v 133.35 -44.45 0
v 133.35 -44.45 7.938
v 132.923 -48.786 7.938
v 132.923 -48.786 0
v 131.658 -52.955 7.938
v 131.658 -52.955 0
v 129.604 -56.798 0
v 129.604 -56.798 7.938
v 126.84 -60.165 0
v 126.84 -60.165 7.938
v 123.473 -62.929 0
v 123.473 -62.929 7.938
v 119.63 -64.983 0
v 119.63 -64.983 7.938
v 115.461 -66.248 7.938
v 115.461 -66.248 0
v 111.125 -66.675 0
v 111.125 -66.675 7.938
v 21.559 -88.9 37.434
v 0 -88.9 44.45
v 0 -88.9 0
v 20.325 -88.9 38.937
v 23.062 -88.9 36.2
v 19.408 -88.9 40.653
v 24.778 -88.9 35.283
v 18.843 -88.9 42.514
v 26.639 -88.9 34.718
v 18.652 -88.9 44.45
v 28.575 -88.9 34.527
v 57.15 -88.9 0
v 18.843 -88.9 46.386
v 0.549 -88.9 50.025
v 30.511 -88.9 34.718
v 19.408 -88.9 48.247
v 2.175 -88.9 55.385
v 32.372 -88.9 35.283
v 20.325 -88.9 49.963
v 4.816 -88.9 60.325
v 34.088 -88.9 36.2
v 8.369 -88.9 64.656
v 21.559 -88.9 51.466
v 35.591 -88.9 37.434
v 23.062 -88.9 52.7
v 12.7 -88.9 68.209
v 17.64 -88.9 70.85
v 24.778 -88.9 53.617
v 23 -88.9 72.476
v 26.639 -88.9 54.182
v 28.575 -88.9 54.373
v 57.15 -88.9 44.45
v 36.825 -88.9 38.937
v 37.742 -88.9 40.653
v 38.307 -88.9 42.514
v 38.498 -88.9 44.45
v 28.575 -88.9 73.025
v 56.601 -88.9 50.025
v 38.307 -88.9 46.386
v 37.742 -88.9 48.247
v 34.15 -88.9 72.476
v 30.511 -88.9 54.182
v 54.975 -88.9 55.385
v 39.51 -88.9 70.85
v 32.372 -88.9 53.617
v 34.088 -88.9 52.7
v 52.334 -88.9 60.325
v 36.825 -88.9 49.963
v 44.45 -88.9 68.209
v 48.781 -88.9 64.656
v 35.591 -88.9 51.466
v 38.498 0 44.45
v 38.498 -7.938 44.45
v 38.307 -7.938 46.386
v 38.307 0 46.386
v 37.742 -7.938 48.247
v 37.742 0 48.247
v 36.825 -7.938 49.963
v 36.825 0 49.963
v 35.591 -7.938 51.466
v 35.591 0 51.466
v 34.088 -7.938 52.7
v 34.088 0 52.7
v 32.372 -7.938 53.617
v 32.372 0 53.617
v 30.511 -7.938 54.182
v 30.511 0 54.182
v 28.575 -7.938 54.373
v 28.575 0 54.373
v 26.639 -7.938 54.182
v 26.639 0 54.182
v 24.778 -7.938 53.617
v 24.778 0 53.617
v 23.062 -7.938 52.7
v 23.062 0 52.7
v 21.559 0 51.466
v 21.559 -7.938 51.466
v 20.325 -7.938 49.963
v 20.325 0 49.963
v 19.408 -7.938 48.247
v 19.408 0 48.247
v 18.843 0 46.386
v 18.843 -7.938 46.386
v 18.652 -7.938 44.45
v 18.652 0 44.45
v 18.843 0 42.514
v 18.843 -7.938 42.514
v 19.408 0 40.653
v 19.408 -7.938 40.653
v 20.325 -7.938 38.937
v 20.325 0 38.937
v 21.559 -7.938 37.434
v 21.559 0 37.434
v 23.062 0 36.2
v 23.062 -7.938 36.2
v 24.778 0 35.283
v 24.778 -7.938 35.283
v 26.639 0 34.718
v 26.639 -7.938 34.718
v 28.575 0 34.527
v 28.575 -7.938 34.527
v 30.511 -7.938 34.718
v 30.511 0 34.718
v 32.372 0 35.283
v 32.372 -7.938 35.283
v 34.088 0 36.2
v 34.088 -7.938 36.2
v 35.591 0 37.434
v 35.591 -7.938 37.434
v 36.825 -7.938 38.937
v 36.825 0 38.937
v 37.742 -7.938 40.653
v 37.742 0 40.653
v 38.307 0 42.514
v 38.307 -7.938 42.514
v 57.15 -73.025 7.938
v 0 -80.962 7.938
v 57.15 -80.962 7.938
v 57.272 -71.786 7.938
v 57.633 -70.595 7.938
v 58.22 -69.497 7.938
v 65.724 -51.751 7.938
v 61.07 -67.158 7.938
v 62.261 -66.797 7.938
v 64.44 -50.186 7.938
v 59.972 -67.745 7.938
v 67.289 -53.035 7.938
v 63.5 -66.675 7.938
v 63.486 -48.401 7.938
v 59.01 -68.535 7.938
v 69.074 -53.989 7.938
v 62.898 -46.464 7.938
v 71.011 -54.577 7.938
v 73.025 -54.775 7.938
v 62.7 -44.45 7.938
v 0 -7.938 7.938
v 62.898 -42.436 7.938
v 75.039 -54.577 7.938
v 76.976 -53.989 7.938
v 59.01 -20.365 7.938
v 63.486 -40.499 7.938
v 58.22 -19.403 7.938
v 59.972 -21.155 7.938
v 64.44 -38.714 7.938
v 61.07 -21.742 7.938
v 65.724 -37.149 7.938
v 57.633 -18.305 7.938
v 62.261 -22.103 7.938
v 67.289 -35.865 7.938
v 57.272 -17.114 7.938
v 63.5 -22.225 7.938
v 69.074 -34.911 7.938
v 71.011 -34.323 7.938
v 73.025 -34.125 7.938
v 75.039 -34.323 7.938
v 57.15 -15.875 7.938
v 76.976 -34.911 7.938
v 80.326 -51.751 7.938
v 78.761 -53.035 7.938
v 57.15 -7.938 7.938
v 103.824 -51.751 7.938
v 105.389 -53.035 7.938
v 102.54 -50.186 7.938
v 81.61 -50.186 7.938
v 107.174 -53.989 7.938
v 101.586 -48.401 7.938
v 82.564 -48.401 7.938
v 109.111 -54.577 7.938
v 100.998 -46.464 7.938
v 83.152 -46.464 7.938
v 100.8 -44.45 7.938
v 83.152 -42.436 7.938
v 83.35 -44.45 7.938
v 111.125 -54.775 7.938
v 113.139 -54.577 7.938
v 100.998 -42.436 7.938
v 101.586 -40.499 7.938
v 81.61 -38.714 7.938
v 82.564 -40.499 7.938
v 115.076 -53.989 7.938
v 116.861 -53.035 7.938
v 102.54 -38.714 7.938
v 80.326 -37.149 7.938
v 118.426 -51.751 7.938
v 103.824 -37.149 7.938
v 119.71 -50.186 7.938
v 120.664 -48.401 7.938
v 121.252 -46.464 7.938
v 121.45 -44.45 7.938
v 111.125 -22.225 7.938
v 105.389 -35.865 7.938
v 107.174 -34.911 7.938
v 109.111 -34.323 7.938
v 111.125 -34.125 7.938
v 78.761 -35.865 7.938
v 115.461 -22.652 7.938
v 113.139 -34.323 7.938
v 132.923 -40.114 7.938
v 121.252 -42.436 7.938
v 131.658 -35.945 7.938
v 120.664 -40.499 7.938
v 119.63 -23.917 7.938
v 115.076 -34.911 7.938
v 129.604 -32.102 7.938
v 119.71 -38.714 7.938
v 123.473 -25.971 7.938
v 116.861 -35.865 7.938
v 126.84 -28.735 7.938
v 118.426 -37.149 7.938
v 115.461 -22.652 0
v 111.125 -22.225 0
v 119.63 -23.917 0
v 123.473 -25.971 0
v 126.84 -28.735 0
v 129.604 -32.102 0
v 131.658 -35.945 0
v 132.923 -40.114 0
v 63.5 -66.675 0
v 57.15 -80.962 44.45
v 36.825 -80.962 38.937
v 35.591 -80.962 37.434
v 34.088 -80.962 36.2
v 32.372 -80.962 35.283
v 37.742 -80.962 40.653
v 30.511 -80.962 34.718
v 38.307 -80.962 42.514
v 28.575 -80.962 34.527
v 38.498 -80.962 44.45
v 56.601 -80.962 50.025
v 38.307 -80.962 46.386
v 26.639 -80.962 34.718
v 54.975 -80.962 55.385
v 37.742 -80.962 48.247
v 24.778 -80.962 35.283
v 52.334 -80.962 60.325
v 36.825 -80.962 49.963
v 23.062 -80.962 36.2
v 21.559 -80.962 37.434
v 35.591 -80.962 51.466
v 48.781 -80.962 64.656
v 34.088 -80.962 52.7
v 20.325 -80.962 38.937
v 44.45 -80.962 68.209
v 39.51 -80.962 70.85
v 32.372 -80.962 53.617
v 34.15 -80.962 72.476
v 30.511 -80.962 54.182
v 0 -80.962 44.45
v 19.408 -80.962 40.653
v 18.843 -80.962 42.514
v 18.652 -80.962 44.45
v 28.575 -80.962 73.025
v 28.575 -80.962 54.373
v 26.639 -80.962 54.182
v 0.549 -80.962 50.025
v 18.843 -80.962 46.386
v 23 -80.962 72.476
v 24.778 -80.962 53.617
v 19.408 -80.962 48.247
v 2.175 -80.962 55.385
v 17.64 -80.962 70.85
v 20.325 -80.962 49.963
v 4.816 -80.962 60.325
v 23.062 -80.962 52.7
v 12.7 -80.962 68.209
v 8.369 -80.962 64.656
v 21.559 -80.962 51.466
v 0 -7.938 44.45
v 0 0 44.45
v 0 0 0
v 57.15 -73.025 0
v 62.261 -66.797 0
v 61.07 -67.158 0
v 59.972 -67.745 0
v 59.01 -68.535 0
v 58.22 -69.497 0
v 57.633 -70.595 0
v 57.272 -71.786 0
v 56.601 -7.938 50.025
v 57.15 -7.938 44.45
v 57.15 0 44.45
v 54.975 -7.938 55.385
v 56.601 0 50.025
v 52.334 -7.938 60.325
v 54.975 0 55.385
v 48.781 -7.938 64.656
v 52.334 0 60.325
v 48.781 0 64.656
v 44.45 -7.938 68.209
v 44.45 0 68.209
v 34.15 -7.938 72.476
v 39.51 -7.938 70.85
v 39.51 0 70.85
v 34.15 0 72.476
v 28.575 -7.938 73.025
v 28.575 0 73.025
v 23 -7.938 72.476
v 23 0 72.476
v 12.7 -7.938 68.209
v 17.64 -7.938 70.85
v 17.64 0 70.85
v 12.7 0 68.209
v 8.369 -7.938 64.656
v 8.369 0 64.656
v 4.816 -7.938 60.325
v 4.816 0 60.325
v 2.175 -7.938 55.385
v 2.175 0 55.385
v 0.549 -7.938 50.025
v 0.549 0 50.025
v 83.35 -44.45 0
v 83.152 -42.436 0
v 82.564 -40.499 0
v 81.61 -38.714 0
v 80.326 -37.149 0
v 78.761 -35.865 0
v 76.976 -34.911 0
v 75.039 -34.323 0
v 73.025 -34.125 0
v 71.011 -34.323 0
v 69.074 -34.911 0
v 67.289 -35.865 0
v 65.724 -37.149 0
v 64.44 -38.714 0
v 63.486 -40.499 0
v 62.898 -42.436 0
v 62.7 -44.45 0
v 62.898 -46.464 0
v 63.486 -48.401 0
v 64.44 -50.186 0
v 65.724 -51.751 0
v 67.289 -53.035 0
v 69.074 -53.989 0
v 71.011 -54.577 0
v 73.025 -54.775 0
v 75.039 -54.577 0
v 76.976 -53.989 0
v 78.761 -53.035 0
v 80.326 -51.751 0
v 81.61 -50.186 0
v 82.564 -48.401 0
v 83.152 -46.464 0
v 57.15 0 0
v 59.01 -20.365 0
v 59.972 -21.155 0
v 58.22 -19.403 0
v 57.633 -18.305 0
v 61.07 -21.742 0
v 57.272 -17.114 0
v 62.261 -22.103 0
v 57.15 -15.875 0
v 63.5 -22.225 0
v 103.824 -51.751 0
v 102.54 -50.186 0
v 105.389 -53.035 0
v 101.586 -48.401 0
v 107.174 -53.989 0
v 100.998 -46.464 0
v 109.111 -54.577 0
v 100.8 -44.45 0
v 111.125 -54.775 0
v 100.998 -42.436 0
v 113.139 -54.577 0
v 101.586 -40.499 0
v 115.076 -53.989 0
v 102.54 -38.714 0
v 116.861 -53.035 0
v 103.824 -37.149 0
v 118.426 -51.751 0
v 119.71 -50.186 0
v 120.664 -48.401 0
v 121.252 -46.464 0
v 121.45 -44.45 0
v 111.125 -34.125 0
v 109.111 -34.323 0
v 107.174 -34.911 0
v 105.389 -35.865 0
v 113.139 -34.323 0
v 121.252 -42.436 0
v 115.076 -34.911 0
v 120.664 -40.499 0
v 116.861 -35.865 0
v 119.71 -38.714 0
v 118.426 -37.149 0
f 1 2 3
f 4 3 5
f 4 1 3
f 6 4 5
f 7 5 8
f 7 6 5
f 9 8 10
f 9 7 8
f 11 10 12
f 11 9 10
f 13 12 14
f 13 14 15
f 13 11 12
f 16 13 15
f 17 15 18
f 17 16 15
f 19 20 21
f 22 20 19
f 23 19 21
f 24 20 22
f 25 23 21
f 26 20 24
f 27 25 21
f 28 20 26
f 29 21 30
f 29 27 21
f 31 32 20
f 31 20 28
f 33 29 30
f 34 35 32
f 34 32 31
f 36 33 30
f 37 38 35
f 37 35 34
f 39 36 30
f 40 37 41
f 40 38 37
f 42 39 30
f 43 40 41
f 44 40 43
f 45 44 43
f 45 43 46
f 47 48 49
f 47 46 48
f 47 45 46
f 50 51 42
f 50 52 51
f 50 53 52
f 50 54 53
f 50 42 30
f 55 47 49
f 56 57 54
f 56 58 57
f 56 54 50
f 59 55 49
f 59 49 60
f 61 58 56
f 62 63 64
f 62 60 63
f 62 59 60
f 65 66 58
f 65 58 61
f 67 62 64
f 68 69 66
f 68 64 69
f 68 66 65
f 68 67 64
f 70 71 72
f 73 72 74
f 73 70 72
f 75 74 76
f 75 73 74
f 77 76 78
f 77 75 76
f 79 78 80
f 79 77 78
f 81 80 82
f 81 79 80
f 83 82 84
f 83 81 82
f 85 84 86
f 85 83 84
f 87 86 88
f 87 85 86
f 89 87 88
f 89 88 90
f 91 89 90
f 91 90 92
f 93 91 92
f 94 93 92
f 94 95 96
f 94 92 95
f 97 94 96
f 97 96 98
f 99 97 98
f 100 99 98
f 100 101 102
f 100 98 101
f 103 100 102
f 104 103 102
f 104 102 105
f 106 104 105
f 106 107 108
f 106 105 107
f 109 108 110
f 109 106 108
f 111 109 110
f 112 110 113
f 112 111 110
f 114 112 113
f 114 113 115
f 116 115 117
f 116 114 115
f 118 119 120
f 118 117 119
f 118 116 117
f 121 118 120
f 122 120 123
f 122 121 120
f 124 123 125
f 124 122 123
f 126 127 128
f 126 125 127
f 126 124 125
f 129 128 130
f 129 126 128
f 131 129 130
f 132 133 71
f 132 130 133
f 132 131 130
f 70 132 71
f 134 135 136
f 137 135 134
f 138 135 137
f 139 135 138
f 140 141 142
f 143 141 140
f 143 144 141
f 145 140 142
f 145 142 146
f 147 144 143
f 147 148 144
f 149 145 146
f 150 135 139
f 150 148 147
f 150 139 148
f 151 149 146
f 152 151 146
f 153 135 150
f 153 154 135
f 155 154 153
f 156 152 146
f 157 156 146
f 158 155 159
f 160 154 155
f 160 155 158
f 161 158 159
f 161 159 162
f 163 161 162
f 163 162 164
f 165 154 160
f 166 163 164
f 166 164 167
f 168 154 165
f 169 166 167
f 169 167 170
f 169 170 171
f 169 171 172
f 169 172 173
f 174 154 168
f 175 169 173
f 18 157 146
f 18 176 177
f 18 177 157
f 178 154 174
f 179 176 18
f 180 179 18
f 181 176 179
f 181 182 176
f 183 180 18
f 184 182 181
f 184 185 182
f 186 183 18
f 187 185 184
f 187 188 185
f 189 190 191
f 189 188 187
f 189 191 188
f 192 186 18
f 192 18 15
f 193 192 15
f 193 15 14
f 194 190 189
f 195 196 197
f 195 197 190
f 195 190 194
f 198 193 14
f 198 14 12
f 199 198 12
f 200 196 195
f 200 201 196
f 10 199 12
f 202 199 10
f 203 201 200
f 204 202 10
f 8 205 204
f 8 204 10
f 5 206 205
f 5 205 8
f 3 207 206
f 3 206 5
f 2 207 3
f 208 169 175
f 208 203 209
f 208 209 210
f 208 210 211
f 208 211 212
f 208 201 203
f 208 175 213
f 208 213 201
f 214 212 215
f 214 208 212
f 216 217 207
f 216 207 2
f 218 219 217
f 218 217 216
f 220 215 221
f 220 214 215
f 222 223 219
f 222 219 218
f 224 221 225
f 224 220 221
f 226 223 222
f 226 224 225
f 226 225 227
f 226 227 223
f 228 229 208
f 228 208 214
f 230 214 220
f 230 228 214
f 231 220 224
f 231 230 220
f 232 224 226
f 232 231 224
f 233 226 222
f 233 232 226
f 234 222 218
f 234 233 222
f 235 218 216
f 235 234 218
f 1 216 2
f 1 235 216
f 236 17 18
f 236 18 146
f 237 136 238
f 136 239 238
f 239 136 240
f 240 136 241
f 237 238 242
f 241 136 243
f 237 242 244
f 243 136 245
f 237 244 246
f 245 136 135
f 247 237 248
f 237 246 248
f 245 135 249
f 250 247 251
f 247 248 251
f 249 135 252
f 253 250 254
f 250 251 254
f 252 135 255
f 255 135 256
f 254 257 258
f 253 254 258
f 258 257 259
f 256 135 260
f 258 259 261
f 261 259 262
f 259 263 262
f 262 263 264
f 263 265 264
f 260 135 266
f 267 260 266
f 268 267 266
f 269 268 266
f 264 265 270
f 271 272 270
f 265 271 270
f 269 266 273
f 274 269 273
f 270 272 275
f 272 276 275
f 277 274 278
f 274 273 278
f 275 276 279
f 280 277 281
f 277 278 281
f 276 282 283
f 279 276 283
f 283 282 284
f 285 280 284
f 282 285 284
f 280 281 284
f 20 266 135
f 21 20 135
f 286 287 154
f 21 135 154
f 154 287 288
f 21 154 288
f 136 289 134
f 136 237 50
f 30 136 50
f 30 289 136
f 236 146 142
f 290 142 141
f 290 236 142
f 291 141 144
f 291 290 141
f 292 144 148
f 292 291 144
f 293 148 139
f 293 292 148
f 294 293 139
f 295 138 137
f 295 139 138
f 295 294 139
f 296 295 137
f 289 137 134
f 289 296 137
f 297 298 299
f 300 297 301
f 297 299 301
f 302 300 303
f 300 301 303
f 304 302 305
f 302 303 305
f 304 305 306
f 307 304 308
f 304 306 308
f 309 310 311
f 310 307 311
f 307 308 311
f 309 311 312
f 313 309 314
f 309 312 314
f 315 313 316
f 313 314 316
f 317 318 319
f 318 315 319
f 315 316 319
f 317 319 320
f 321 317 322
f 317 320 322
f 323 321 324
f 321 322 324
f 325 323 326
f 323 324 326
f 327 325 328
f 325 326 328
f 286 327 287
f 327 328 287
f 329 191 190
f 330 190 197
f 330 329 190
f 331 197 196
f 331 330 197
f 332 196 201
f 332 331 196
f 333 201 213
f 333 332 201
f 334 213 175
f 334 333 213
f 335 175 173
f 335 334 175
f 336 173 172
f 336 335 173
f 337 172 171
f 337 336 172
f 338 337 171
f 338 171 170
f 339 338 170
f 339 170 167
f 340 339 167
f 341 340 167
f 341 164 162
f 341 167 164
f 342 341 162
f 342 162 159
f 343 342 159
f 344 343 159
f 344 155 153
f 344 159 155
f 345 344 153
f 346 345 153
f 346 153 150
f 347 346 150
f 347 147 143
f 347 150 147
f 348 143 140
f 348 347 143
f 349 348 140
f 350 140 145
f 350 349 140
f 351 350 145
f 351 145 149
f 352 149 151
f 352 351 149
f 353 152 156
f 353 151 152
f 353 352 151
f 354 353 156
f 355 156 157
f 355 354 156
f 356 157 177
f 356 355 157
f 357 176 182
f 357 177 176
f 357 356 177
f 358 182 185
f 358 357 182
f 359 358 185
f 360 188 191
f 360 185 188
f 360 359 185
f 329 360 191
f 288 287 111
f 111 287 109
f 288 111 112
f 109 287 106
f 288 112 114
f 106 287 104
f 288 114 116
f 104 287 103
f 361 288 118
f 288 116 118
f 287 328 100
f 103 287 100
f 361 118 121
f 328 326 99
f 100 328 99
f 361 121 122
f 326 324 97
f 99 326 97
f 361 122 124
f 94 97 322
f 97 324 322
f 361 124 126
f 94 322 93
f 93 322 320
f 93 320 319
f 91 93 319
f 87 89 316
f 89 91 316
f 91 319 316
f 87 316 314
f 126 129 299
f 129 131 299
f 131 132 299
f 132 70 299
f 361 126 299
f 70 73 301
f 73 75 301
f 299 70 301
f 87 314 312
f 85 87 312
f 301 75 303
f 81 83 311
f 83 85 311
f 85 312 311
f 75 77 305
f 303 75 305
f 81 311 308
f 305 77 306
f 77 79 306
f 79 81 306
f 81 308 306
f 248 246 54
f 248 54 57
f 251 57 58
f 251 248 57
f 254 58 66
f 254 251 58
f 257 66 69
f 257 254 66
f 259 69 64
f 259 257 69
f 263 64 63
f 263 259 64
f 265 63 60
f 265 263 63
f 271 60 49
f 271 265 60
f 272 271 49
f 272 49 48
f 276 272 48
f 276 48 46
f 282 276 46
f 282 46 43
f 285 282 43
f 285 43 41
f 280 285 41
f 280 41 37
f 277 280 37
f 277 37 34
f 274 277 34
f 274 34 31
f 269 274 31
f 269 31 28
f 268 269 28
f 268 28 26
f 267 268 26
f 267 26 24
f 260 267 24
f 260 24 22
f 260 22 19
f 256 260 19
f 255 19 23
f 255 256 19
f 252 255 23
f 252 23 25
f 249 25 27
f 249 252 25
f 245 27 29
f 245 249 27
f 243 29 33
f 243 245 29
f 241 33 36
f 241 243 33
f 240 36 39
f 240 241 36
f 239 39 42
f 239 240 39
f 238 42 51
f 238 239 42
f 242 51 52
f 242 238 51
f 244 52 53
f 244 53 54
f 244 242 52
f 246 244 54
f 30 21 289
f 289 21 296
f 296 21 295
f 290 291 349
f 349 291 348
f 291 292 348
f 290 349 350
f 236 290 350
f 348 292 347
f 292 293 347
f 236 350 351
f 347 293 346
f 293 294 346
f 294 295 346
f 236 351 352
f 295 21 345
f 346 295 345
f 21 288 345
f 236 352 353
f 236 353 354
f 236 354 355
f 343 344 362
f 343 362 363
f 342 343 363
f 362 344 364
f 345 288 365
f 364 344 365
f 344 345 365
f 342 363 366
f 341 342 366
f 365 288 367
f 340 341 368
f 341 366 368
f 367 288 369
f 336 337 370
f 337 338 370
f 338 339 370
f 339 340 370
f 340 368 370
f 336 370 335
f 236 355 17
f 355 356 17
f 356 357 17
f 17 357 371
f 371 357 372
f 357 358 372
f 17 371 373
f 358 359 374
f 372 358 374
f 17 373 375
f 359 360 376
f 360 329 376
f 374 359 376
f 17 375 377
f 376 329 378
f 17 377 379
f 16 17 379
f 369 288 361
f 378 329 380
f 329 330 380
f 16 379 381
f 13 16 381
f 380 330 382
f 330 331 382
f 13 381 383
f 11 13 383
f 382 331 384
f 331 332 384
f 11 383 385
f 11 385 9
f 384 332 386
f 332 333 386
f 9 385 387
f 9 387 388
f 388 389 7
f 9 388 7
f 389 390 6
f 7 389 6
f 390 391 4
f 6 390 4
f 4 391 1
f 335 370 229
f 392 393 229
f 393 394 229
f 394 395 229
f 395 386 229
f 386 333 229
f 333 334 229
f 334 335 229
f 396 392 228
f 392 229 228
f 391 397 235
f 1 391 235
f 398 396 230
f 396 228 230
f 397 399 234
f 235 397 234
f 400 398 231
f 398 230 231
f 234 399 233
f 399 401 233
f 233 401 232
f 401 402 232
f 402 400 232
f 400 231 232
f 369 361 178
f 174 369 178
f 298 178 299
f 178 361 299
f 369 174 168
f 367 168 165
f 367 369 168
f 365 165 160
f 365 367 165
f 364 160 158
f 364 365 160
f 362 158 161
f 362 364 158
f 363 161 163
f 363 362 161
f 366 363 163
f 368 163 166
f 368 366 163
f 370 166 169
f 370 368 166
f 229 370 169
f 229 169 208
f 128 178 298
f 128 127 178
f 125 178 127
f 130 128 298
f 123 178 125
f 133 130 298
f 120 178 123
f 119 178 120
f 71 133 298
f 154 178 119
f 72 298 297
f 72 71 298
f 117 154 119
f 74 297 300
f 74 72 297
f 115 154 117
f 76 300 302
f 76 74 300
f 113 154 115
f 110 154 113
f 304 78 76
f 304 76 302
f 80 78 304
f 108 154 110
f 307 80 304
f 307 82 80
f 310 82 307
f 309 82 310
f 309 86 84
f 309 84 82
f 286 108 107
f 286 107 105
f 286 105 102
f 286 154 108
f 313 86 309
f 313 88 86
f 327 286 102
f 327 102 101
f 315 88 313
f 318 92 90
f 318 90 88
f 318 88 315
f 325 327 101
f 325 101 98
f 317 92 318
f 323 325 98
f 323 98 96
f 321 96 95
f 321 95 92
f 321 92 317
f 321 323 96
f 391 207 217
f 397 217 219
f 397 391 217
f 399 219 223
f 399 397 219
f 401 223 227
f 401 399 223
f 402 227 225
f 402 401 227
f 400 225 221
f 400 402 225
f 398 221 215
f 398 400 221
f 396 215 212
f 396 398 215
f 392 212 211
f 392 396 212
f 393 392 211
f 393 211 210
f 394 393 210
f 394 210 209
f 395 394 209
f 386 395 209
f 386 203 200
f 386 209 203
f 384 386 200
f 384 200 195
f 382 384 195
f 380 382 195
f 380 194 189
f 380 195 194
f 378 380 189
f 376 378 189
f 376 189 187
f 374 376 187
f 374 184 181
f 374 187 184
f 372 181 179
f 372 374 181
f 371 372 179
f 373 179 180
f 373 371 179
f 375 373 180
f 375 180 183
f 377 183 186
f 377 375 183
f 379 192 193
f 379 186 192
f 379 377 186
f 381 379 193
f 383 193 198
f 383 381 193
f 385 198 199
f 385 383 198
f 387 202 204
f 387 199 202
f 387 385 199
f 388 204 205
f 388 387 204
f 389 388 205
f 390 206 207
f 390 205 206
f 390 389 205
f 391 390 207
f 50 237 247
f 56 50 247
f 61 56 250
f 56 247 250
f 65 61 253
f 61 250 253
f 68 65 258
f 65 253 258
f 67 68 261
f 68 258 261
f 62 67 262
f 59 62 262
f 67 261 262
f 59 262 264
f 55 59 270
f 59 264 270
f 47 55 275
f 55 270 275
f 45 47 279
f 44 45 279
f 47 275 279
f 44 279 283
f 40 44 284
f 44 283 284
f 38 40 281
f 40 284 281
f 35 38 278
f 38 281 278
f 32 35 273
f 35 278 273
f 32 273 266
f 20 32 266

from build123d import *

# Parameters (mm, degrees)
F0_R     = 9.92251
F0_W     = 76.2
F0_H     = 7.9375
F1_DEPTH = 88.9
F2_W     = 73.025
F2_H     = 65.0875
F3_DEPTH = 63.5
F4_R     = 10.3251
F5_DEPTH = 25.4


with BuildPart() as f1:
    # F0 (on Front) → F1 (new body)
    with BuildSketch(Plane.XZ):
        with BuildLine():
            ThreePointArc((57.15, 44.45), (28.575, 73.025), (0, 44.45))
            Line((0, 44.45), (0, 0))
            Line((0, 0), (57.15, 0))
            Line((57.15, 0), (57.15, 7.9375))
            Line((57.15, 7.9375), (57.15, 44.45))
        make_face()
        with Locations((28.575, 44.45)):
            Circle(F0_R, mode=Mode.SUBTRACT)
        with Locations((95.25, 3.96875)):
            Rectangle(F0_W, F0_H)
    extrude(amount=F1_DEPTH)

    # F2 (on Right) → F3 (cut)
    with BuildSketch(Plane.YZ):
        with Locations((-44.45, 40.48125)):
            Rectangle(F2_W, F2_H)
    extrude(amount=F3_DEPTH, mode=Mode.SUBTRACT)

    # F4 (on Top) → F5 (cut)
    with BuildSketch(Plane.XY):
        with Locations((73.025, -44.45)):
            Circle(F4_R)
        with Locations((111.125, -44.45)):
            Circle(F4_R)
        with BuildLine():
            Line((57.15, -88.9), (133.35, -88.9))
            Line((133.35, -88.9), (133.35, -44.45))
            ThreePointArc((133.35, -44.45), (126.840448, -60.165448), (111.125, -66.675))
            Line((111.125, -66.675), (63.5, -66.675))
            ThreePointArc((63.5, -66.675), (59.009872, -68.534872), (57.15, -73.025))
            Line((57.15, -73.025), (57.15, -88.9))
        make_face()
        with BuildLine():
            ThreePointArc((111.125, -22.225), (126.840448, -28.734552), (133.35, -44.45))
            Line((133.35, -44.45), (133.35, 0))
            Line((133.35, 0), (57.15, 0))
            Line((57.15, 0), (57.15, -15.875))
            ThreePointArc((57.15, -15.875), (59.009872, -20.365128), (63.5, -22.225))
            Line((63.5, -22.225), (111.125, -22.225))
        make_face()
    extrude(amount=F5_DEPTH, mode=Mode.SUBTRACT)


solid = f1.part
